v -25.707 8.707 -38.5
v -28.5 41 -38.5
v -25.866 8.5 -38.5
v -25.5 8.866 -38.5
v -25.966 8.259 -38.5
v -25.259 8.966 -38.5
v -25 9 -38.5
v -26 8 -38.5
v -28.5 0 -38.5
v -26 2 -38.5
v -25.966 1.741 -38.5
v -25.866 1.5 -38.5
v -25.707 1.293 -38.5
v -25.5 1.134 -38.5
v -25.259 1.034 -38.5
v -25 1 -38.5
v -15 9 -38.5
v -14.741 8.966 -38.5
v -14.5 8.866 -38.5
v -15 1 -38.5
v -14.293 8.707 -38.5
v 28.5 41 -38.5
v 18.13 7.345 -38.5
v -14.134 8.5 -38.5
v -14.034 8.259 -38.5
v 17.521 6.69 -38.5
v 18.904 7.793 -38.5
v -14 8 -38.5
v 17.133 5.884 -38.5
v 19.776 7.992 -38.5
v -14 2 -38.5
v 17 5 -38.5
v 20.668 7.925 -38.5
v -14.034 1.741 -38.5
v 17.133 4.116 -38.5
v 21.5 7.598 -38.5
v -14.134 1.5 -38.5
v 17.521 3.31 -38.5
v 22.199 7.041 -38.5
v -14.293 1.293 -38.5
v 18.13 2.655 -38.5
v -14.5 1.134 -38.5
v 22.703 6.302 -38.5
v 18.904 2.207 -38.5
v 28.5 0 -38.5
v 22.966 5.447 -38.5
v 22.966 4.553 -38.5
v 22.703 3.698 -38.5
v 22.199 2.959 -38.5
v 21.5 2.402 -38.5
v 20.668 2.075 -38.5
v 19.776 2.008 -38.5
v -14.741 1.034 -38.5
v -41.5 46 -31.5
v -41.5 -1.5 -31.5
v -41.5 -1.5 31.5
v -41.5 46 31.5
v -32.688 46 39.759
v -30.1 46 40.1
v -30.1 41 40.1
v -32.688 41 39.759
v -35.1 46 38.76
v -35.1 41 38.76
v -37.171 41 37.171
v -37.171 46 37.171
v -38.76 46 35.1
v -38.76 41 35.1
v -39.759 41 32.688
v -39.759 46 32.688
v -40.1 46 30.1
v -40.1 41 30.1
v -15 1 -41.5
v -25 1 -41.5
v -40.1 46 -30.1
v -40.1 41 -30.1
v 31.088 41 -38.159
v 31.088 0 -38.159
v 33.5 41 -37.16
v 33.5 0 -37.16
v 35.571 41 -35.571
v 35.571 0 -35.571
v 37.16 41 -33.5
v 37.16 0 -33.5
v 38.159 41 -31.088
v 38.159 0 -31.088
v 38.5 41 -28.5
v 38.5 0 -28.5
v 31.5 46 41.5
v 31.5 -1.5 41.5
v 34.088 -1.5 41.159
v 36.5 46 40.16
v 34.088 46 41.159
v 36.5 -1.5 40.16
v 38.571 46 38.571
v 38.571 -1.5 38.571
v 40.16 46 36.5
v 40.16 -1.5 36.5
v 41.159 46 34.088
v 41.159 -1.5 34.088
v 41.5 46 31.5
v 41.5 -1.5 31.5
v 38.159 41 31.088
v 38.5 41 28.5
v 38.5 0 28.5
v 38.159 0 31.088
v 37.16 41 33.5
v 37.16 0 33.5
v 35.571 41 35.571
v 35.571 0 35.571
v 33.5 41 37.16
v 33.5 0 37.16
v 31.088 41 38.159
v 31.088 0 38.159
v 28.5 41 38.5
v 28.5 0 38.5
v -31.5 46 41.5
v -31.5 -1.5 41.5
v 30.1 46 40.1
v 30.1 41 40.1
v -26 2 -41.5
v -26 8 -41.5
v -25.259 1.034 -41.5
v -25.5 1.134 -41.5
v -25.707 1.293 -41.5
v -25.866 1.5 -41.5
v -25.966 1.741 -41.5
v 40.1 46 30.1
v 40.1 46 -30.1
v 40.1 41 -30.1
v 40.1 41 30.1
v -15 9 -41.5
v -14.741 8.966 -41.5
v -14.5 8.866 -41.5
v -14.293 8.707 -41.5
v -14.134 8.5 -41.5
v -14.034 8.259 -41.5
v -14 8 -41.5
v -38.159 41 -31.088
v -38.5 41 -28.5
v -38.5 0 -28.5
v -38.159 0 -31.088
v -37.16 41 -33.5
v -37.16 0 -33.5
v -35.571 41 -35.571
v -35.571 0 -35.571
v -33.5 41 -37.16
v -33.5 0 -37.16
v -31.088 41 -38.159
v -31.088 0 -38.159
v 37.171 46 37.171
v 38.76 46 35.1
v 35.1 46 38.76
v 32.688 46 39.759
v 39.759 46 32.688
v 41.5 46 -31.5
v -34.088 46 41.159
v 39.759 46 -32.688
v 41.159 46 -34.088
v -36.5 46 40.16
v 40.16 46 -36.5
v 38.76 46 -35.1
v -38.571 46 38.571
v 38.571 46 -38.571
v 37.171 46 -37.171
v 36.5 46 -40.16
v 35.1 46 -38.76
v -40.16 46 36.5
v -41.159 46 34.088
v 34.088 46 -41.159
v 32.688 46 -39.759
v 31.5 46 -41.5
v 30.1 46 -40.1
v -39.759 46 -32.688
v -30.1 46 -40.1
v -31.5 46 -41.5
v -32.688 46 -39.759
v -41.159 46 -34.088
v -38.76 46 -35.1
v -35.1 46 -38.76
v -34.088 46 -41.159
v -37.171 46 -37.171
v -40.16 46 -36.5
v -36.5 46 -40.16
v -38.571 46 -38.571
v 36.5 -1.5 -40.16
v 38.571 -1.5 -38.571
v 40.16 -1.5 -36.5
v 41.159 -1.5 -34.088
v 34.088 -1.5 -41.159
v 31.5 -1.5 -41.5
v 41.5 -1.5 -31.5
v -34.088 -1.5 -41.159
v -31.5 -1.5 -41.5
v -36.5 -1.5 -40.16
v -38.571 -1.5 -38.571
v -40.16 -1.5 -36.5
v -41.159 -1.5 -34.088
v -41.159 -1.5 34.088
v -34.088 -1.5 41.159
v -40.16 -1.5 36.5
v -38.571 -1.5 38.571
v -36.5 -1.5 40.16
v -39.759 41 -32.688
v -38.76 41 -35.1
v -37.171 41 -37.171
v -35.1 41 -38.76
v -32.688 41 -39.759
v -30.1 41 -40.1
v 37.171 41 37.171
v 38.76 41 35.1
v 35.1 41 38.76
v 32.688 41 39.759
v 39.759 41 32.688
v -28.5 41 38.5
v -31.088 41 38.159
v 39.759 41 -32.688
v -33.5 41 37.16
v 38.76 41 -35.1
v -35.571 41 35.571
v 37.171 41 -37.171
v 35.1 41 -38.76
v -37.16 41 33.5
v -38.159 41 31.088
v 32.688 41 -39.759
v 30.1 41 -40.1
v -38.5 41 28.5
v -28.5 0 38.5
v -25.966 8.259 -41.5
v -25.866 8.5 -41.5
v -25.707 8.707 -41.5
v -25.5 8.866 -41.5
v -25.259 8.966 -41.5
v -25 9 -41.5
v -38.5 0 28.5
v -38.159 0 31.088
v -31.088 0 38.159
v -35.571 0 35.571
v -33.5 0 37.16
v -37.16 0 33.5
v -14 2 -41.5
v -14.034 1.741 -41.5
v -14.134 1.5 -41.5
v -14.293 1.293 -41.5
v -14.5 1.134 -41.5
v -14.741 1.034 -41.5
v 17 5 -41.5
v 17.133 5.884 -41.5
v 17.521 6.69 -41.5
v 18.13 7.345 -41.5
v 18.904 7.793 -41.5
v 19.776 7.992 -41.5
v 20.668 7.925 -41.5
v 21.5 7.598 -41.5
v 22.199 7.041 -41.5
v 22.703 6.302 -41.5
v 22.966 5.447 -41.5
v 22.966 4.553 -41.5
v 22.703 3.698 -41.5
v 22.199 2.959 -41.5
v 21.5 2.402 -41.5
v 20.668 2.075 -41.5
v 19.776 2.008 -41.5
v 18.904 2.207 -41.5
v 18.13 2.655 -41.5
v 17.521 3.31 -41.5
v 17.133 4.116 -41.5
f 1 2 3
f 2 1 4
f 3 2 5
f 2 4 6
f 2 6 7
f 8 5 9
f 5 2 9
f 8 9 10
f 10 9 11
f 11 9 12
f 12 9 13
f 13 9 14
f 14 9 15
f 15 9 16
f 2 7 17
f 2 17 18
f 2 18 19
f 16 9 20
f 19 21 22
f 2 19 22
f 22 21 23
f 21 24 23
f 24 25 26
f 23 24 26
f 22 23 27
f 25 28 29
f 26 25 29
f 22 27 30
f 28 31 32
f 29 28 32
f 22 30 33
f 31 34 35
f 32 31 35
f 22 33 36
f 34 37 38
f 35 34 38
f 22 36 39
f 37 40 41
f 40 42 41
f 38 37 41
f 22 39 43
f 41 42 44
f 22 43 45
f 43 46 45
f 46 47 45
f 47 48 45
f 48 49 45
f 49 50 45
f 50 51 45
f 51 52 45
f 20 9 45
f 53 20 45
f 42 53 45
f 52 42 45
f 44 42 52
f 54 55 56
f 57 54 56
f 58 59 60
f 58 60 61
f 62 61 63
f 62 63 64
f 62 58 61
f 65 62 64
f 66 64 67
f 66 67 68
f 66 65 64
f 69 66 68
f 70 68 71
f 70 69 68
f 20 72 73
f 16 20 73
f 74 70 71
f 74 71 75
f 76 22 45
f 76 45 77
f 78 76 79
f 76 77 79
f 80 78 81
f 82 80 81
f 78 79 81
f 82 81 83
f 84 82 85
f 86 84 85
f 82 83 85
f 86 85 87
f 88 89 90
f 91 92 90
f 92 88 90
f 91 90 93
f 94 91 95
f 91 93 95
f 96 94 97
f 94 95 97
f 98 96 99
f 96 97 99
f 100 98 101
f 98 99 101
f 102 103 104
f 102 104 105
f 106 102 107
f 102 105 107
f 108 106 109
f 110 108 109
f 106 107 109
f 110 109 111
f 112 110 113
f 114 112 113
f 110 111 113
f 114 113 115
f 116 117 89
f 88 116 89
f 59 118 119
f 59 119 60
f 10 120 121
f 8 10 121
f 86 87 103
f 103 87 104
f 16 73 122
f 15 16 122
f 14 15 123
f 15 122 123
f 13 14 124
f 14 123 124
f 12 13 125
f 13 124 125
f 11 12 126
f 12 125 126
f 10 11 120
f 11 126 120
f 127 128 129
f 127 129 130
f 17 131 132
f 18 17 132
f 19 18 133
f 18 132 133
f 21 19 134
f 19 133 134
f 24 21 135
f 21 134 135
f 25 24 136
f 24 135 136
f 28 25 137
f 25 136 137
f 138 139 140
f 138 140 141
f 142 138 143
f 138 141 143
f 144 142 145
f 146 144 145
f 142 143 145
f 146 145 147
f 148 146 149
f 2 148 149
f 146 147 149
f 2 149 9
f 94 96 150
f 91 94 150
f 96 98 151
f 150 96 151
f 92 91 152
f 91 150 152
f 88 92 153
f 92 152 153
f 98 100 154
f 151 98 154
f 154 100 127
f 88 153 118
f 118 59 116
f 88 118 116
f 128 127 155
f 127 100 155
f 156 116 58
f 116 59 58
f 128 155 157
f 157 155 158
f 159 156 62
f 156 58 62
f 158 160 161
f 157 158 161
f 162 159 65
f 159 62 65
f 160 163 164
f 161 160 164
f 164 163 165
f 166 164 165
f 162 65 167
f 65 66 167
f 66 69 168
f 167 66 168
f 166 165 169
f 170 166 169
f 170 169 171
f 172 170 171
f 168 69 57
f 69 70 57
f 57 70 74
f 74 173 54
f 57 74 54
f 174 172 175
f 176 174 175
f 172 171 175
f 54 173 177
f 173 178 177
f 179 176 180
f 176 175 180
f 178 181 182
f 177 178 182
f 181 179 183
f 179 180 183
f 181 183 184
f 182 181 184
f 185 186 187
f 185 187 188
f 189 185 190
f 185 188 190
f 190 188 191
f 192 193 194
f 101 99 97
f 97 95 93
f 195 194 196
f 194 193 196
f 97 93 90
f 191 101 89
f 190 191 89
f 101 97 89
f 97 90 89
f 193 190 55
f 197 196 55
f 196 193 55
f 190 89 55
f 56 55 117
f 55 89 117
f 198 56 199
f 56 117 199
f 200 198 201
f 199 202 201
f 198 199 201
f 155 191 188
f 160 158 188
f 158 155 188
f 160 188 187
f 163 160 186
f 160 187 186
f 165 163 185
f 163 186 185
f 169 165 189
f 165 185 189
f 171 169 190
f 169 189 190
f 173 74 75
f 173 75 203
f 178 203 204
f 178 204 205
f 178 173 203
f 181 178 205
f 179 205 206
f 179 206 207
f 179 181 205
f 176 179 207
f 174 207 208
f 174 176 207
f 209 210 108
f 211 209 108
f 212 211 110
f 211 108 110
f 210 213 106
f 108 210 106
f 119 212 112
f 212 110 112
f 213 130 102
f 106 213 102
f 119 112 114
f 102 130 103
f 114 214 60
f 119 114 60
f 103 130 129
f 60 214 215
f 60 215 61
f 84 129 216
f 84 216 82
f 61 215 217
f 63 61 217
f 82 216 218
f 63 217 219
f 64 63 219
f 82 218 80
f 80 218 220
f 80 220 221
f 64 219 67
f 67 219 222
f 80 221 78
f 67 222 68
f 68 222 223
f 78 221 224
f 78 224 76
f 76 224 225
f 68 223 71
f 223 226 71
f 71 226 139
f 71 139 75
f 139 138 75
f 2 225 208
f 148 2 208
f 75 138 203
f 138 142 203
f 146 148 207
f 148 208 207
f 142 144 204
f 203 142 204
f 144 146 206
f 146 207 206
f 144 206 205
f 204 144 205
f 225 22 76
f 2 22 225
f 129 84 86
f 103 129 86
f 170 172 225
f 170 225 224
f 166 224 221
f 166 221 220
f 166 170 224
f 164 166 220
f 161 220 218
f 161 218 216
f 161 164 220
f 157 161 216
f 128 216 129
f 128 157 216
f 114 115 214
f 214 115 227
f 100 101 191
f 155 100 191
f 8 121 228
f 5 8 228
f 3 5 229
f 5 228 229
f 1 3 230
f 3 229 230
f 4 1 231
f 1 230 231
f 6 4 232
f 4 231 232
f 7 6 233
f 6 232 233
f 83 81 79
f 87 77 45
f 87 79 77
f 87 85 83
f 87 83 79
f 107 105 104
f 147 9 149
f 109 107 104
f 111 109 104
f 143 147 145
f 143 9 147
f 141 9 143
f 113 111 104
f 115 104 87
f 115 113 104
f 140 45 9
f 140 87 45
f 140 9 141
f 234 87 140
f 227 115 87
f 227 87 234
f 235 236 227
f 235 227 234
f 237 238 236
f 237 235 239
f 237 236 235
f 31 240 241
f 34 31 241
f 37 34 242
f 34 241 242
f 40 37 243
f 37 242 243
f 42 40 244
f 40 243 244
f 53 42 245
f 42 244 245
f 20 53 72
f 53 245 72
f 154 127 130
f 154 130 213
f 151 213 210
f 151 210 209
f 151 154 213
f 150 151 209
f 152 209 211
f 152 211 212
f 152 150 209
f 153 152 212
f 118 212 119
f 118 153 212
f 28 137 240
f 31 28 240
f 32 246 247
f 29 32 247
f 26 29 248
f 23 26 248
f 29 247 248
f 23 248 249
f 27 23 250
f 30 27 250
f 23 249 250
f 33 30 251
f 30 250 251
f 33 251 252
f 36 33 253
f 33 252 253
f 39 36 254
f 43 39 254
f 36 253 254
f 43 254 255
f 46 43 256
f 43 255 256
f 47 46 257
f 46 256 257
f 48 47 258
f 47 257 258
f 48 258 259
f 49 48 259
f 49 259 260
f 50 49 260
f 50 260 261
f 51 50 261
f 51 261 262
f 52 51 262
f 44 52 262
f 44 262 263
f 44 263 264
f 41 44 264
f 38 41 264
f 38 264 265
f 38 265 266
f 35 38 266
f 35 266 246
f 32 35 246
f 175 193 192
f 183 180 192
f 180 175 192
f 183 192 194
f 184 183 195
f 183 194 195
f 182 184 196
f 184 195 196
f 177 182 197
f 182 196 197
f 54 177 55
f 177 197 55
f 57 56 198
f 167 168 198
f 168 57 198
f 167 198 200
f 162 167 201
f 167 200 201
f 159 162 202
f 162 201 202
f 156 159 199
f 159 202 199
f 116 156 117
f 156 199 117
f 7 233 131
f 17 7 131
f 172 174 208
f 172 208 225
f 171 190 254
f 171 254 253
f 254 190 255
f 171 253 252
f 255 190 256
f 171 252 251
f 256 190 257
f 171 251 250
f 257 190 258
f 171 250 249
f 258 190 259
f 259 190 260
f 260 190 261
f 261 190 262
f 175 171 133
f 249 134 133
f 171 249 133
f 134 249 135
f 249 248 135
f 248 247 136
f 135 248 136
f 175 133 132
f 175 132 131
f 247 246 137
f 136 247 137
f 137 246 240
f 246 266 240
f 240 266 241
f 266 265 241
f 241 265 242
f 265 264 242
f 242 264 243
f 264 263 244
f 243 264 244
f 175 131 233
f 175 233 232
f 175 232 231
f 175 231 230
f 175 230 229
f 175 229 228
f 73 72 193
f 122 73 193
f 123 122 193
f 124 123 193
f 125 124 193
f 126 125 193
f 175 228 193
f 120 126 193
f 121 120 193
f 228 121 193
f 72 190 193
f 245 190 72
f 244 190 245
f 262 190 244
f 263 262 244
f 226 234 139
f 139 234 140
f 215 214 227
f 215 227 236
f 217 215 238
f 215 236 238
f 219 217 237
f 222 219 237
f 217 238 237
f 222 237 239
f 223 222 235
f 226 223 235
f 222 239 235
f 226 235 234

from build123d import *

# Parameters (mm, degrees)
BOSS_EXTRUDE1_DEPTH = 46
CUT_EXTRUDE1_DEPTH  = 5
BOSS_EXTRUDE2_START = 1.5
BOSS_EXTRUDE2_DEPTH = 1.5
SKETCH4_R           = 3
CUT_EXTRUDE2_DEPTH  = 8


with BuildPart() as part:
    # Sketch1 → Boss-Extrude1 (new body)
    with BuildSketch(Plane(origin=(0, 0, 0), x_dir=(1, 0, 0), z_dir=(0, 1, 0))):
        with BuildLine():
            Line((-31.5, 41.5), (31.5, 41.5))
            ThreePointArc((31.5, 41.5), (38.571067812, 38.571067812), (41.5, 31.5))
            Line((41.5, 31.5), (41.5, -31.5))
            ThreePointArc((41.5, -31.5), (38.571067812, -38.571067812), (31.5, -41.5))
            Line((31.5, -41.5), (-31.5, -41.5))
            ThreePointArc((-31.5, -41.5), (-38.571067812, -38.571067812), (-41.5, -31.5))
            Line((-41.5, -31.5), (-41.5, 31.5))
            ThreePointArc((-41.5, 31.5), (-38.571067812, 38.571067812), (-31.5, 41.5))
        make_face()
        with BuildLine():
            Line((-28.5, 38.5), (28.5, 38.5))
            ThreePointArc((28.5, 38.5), (35.571067812, 35.571067812), (38.5, 28.5))
            Line((38.5, 28.5), (38.5, -28.5))
            ThreePointArc((38.5, -28.5), (35.571067812, -35.571067812), (28.5, -38.5))
            Line((28.5, -38.5), (-28.5, -38.5))
            ThreePointArc((-28.5, -38.5), (-35.571067812, -35.571067812), (-38.5, -28.5))
            Line((-38.5, -28.5), (-38.5, 28.5))
            ThreePointArc((-38.5, 28.5), (-35.571067812, 35.571067812), (-28.5, 38.5))
        make_face(mode=Mode.SUBTRACT)
    extrude(amount=BOSS_EXTRUDE1_DEPTH)

    # Sketch2 → Cut-Extrude1 (cut)
    with BuildSketch(Plane(origin=(0, 46, 0), x_dir=(1, 0, 0), z_dir=(0, 1, 0))):
        with BuildLine():
            Line((-30.1, 40.1), (30.1, 40.1))
            ThreePointArc((30.1, 40.1), (37.171067812, 37.171067812), (40.1, 30.1))
            Line((40.1, 30.1), (40.1, -30.1))
            ThreePointArc((40.1, -30.1), (37.171067812, -37.171067812), (30.1, -40.1))
            Line((30.1, -40.1), (-30.1, -40.1))
            ThreePointArc((-30.1, -40.1), (-37.171067812, -37.171067812), (-40.1, -30.1))
            Line((-40.1, -30.1), (-40.1, 30.1))
            ThreePointArc((-40.1, 30.1), (-37.171067812, 37.171067812), (-30.1, 40.1))
        make_face()
    extrude(amount=-CUT_EXTRUDE1_DEPTH, mode=Mode.SUBTRACT)

    # Sketch3 → Boss-Extrude2 (add)
    with BuildSketch(Plane.XZ.offset(BOSS_EXTRUDE2_START)):
        with BuildLine():
            Line((-31.5, 41.5), (31.5, 41.5))
            ThreePointArc((31.5, 41.5), (38.571067812, 38.571067812), (41.5, 31.5))
            Line((41.5, 31.5), (41.5, -31.5))
            ThreePointArc((41.5, -31.5), (38.571067812, -38.571067812), (31.5, -41.5))
            Line((31.5, -41.5), (-31.5, -41.5))
            ThreePointArc((-31.5, -41.5), (-38.571067812, -38.571067812), (-41.5, -31.5))
            Line((-41.5, -31.5), (-41.5, 31.5))
            ThreePointArc((-41.5, 31.5), (-38.571067812, 38.571067812), (-31.5, 41.5))
        make_face()
    extrude(amount=-BOSS_EXTRUDE2_DEPTH)

    # Sketch4 → Cut-Extrude2 (cut)
    with BuildSketch(Plane(origin=(0, 0, -41.5), x_dir=(-1, 0, 0), z_dir=(0, 0, -1))):
        with Locations((-20, 5)):
            Circle(SKETCH4_R)
        with BuildLine():
            Line((15, 1), (25, 1))
            ThreePointArc((25, 1), (25.707106781, 1.292893219), (26, 2))
            Line((26, 2), (26, 8))
            ThreePointArc((26, 8), (25.707106781, 8.707106781), (25, 9))
            Line((25, 9), (15, 9))
            ThreePointArc((15, 9), (14.292893219, 8.707106781), (14, 8))
            Line((14, 8), (14, 2))
            ThreePointArc((14, 2), (14.292893219, 1.292893219), (15, 1))
        make_face()
    extrude(amount=-CUT_EXTRUDE2_DEPTH, mode=Mode.SUBTRACT)


solid = part.part
